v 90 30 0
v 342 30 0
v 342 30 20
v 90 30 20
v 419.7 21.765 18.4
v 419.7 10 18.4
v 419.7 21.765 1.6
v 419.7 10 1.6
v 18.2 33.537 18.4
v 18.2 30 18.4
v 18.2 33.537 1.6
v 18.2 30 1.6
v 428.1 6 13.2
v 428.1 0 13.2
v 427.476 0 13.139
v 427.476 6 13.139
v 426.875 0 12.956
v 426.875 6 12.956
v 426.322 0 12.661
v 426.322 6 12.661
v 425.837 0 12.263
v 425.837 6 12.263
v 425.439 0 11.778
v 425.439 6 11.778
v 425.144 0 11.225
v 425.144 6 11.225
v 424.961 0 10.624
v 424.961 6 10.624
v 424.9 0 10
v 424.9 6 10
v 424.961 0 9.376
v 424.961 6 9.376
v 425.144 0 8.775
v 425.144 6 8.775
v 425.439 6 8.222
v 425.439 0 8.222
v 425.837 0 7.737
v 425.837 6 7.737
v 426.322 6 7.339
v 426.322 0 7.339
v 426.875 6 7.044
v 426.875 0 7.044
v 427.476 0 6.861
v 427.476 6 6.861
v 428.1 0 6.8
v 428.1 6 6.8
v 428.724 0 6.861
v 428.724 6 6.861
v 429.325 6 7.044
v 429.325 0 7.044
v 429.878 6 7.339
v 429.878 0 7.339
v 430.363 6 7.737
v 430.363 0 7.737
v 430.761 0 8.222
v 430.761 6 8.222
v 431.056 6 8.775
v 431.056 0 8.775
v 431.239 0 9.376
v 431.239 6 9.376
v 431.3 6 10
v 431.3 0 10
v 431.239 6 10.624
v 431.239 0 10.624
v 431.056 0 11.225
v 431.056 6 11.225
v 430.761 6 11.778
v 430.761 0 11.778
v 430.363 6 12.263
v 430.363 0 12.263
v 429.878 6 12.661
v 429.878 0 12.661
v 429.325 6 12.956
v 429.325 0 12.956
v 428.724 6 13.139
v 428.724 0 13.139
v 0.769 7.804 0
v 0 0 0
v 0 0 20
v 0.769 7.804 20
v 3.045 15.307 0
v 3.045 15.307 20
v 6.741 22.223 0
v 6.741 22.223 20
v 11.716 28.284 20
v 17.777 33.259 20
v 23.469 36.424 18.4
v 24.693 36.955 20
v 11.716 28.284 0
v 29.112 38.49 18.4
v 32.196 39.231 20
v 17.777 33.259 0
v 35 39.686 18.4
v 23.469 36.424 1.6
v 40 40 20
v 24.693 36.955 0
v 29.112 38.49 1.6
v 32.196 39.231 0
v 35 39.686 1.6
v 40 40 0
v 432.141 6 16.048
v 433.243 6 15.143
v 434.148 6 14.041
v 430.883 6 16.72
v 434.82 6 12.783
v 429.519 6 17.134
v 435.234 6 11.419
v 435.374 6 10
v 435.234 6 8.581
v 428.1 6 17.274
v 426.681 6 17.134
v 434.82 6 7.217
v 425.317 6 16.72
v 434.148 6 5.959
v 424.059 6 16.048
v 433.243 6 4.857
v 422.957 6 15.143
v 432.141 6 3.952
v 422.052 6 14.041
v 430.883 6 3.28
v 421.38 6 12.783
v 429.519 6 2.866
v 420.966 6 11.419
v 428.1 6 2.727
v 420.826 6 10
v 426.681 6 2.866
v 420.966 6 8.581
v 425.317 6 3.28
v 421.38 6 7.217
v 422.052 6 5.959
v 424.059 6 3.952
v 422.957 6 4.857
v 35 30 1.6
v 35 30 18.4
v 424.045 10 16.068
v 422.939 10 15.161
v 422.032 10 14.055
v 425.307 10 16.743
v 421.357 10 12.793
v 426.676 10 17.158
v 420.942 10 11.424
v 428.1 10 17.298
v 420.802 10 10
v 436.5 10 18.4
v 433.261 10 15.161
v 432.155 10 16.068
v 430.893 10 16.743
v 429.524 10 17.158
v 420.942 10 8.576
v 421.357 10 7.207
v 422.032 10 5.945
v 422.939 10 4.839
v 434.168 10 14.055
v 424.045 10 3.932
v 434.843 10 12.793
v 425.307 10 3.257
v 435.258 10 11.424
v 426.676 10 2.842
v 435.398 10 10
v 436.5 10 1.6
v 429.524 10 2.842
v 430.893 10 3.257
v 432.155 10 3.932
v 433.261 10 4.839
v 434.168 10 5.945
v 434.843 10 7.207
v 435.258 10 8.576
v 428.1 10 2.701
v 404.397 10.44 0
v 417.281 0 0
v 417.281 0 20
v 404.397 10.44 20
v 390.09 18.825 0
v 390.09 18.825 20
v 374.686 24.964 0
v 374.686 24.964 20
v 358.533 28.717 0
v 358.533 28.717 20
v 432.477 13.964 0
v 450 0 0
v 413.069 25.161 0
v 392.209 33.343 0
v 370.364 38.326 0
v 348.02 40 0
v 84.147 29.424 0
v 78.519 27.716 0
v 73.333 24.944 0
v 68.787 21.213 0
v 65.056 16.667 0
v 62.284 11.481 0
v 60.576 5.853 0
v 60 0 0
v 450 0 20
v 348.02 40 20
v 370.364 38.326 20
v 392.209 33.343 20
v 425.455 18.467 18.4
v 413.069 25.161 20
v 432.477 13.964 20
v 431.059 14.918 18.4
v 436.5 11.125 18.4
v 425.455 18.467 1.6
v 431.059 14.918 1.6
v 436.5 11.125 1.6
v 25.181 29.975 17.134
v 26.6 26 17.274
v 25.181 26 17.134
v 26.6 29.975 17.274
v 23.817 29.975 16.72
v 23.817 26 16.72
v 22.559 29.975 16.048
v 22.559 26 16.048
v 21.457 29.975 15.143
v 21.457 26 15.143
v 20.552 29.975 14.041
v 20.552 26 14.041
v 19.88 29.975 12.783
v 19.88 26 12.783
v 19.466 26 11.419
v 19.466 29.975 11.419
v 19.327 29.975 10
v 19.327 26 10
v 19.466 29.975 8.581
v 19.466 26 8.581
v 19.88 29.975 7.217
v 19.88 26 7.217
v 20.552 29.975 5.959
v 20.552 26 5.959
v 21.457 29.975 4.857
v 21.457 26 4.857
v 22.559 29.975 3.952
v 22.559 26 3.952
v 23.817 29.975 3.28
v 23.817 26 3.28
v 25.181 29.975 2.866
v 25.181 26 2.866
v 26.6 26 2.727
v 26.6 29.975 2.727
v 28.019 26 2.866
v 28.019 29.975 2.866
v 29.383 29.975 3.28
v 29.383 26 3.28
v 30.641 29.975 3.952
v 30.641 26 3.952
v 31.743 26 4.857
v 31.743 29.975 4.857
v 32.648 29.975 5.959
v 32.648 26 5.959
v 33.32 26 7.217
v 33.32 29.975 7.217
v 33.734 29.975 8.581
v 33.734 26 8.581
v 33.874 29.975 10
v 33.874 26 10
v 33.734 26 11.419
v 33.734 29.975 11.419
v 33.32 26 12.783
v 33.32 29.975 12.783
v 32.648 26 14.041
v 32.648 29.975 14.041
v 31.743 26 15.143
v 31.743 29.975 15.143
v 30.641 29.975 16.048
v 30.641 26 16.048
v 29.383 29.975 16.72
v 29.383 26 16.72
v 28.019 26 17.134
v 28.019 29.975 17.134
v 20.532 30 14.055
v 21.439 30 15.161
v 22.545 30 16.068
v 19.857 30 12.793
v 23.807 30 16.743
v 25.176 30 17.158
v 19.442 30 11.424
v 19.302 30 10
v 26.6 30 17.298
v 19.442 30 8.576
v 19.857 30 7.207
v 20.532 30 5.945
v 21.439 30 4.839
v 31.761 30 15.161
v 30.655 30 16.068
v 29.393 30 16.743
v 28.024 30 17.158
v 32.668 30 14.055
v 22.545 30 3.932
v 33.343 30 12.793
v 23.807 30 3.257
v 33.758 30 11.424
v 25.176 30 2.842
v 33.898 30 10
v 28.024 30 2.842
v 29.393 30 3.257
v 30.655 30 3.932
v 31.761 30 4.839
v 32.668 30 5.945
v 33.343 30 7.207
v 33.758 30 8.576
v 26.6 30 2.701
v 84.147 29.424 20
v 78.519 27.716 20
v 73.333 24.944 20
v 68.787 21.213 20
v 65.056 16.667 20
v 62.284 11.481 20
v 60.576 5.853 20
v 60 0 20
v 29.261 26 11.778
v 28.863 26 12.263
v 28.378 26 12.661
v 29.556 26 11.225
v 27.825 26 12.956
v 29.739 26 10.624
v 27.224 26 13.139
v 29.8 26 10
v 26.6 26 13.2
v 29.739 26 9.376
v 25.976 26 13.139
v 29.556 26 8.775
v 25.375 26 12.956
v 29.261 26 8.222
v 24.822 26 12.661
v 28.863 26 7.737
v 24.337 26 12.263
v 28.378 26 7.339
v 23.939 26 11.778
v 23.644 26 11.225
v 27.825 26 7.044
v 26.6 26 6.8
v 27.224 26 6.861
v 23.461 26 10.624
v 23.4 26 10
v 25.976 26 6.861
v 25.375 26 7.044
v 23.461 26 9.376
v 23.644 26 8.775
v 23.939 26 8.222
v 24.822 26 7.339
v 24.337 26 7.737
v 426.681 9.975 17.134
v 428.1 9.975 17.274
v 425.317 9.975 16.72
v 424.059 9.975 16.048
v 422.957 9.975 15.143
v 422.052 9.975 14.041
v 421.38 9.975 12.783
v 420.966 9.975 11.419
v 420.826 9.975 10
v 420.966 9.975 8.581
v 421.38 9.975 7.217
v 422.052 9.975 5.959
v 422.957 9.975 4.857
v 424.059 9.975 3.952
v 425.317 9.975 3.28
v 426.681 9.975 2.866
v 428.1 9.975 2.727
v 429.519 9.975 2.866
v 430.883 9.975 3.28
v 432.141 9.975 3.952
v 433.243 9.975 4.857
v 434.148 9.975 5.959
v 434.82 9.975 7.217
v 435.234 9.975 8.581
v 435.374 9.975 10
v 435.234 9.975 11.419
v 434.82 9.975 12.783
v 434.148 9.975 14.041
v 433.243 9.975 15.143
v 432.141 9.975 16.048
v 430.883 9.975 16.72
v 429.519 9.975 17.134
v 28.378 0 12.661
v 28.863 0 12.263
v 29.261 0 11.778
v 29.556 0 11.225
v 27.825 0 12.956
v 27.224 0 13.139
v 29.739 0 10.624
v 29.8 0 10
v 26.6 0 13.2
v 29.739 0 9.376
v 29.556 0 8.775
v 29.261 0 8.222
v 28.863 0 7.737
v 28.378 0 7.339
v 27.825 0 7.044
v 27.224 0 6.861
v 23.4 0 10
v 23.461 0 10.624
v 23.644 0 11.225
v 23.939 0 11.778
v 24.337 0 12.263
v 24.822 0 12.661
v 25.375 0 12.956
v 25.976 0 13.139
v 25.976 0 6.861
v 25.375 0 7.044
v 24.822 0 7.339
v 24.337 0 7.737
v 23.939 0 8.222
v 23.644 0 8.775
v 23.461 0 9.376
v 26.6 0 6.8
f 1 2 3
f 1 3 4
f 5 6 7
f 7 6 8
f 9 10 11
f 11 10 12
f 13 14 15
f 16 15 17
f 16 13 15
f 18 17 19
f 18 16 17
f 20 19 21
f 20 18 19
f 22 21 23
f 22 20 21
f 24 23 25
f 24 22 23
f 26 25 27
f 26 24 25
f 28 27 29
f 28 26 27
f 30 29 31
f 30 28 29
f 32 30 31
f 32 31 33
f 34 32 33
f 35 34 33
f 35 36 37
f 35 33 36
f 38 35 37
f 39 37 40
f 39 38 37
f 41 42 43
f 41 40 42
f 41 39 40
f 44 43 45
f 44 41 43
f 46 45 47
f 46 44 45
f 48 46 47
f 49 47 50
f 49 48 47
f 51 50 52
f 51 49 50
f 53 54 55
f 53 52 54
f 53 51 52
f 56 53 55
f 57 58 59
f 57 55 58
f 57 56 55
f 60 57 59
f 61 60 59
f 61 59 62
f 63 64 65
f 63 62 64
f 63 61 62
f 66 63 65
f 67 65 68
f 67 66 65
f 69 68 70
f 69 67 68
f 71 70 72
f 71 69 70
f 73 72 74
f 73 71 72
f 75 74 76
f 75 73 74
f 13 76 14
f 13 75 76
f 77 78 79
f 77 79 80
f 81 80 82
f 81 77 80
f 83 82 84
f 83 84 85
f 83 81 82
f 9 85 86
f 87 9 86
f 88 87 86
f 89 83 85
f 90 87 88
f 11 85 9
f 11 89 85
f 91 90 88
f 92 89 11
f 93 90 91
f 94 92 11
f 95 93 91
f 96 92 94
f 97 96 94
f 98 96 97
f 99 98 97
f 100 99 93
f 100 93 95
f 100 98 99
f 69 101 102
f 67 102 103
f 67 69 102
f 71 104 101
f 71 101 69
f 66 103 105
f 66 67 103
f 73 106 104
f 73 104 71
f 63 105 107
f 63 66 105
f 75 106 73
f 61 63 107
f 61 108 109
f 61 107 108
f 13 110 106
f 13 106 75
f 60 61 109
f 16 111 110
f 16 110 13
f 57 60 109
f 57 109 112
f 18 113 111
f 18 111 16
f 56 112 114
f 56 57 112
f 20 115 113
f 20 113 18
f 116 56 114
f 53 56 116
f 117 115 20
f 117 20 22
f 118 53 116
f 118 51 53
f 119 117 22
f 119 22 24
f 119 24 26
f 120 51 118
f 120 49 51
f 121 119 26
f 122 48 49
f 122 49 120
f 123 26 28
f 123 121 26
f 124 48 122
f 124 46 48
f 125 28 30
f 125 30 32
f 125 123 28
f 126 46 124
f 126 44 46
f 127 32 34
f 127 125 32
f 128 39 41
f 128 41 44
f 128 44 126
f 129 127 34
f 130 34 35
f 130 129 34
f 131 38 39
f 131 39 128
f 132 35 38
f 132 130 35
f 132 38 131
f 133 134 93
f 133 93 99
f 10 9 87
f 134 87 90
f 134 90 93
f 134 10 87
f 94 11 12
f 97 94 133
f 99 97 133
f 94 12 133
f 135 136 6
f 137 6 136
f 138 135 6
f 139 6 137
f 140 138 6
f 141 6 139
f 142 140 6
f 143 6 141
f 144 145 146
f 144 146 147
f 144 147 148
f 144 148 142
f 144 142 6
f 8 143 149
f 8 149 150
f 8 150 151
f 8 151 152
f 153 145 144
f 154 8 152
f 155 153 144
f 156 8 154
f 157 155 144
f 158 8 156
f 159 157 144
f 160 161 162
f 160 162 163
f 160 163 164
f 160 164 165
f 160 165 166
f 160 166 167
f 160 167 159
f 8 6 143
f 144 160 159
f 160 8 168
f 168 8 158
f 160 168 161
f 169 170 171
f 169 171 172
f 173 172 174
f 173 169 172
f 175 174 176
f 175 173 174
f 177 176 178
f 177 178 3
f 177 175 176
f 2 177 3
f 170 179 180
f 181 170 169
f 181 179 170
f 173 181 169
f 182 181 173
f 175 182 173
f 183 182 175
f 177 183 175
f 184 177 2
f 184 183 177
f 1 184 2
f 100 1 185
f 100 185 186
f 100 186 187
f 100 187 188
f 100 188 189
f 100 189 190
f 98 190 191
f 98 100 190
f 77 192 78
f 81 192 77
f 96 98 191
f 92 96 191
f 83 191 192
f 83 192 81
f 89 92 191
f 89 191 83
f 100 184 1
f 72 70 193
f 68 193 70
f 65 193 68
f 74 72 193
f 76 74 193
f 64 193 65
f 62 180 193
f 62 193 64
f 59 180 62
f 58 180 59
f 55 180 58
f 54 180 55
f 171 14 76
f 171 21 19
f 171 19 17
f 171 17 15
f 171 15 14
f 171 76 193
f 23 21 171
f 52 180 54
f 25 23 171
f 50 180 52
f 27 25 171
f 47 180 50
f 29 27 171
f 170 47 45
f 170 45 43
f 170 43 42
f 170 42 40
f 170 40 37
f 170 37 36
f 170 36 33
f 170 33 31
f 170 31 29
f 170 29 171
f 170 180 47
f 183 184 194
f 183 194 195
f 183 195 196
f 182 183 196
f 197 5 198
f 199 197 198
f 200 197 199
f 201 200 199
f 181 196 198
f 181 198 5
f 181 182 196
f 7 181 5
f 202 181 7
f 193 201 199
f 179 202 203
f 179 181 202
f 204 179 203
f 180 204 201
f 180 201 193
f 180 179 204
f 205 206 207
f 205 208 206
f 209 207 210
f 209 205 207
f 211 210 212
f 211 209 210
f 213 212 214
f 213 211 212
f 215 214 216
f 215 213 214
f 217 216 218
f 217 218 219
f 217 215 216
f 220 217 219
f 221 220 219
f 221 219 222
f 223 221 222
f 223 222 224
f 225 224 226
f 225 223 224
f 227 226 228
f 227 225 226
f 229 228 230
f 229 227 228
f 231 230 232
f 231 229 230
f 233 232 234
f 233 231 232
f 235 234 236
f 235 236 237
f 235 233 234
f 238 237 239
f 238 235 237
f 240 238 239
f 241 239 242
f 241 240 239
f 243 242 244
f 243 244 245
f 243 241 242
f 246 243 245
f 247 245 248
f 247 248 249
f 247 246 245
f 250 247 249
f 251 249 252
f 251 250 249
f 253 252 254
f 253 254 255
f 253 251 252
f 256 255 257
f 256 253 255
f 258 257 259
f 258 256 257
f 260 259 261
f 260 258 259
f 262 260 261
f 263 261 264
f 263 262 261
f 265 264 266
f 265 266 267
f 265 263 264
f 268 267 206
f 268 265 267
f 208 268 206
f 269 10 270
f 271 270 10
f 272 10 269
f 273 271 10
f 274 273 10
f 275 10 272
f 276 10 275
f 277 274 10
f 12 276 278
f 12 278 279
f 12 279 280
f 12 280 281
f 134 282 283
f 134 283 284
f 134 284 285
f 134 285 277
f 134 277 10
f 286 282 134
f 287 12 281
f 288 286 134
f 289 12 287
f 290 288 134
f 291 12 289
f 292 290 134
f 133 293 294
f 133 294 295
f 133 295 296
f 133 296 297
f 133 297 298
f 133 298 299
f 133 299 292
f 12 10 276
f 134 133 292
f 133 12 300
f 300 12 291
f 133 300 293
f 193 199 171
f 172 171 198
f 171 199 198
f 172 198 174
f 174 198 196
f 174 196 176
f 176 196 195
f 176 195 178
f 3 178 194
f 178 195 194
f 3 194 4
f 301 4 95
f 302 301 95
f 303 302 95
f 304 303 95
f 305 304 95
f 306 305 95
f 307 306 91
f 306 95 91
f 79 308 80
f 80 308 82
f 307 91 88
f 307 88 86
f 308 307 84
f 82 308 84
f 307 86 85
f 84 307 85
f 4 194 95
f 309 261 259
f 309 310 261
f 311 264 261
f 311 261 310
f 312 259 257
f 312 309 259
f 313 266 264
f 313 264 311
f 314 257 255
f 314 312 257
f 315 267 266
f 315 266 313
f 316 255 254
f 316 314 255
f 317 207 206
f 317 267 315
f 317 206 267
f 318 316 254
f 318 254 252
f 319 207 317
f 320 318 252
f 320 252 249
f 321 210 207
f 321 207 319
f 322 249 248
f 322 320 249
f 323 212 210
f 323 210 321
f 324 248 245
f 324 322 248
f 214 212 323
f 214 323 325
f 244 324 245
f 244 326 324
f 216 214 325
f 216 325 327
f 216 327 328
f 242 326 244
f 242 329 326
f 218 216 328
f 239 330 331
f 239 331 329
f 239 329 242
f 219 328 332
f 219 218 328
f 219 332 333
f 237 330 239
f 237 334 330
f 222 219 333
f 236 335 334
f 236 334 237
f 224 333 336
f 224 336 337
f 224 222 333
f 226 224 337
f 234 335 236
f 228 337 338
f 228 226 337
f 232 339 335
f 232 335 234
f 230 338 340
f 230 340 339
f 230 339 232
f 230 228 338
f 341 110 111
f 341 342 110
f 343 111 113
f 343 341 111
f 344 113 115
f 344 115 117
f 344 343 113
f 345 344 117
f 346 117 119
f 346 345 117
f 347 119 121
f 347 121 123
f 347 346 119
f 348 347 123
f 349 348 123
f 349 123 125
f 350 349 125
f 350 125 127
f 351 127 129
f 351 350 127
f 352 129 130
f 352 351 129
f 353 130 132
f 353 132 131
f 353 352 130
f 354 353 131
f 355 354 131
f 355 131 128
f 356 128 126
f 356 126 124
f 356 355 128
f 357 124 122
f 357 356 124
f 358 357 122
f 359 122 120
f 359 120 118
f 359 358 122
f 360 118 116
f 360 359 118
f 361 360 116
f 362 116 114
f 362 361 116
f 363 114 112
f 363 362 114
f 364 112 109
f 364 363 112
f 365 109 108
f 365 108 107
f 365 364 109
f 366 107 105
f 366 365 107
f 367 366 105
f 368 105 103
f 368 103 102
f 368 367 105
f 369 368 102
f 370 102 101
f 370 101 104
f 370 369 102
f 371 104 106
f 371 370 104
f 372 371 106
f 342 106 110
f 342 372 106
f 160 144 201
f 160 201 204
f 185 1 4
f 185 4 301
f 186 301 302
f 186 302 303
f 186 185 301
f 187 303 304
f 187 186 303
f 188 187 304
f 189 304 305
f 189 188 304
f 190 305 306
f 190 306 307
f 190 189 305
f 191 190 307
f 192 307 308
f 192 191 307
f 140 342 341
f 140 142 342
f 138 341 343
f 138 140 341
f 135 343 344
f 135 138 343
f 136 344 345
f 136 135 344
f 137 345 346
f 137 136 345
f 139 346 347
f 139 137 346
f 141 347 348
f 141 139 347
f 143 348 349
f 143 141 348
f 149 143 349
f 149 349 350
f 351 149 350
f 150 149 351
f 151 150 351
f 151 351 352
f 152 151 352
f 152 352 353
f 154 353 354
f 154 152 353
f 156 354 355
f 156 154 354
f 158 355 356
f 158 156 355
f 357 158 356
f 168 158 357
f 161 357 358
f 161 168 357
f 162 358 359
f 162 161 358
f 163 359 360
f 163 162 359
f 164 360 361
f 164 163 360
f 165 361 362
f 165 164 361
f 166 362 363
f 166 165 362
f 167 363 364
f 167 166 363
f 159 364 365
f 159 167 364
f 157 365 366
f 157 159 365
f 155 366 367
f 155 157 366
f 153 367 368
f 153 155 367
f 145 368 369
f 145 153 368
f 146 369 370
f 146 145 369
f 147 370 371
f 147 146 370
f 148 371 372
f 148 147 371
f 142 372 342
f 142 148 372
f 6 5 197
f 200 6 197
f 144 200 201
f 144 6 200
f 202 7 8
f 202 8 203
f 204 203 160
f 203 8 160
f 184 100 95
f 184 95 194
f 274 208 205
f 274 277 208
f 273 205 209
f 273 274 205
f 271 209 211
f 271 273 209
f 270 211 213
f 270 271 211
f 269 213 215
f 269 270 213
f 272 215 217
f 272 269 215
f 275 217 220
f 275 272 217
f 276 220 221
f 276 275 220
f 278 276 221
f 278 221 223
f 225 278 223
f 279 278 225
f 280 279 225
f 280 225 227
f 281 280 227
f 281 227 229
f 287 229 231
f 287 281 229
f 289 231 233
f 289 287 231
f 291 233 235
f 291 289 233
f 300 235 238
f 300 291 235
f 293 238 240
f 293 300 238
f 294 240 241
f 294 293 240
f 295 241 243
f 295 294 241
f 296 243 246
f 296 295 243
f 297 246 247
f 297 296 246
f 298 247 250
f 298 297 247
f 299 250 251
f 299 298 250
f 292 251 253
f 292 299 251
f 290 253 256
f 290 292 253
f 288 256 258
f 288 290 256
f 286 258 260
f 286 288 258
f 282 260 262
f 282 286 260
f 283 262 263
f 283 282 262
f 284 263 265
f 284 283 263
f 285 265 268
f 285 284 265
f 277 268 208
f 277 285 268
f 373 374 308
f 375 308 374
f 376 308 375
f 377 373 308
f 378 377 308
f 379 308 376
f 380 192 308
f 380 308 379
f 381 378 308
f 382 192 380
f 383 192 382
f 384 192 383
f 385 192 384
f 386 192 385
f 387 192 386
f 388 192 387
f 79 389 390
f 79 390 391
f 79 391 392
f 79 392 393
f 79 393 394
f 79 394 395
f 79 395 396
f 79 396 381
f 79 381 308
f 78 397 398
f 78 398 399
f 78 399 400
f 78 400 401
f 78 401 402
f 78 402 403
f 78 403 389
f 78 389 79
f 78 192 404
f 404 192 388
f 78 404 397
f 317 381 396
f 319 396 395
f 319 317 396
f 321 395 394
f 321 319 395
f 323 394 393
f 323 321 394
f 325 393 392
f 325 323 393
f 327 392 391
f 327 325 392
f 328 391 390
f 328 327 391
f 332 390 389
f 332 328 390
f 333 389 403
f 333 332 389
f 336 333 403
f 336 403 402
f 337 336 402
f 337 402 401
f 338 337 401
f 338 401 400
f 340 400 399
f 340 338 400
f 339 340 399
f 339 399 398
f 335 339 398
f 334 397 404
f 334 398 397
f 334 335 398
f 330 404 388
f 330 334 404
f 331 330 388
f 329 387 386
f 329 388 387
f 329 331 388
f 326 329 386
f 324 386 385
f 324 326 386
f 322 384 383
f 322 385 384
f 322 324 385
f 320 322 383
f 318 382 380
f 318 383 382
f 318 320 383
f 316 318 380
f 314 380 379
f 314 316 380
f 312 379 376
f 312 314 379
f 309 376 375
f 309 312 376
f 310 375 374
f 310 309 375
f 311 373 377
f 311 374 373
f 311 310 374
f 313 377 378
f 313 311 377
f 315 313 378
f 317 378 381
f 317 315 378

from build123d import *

# Parameters (mm, degrees)
DODANIE_WYCI_GNI_CIE2_DEPTH = 20
SZKIC28_W                   = 16.8
SZKIC28_H                   = 16.8
WYTNIJ_WYCI_GNI_CIE1_DEPTH  = 20
SZKIC29_W                   = 16.8
SZKIC29_H                   = 16.8
WYTNIJ_WYCI_GNI_CIE2_DEPTH  = 20


with BuildPart() as part:
    # Szkic1 → Dodanie-wyciągnięcie2 (new body)
    with BuildSketch(Plane.XY):
        with BuildLine():
            Line((40, 40), (348.019609728, 40))
            ThreePointArc((348.019609728, 40), (402.791865479, 29.642400438), (450, 0))
            Line((450, 0), (417.280680948, 0))
            ThreePointArc((417.280680948, 0), (382.503671889, 22.185117958), (342, 30))
            Line((342, 30), (116.308192204, 30))
            Line((116.308192204, 30), (90, 30))
            ThreePointArc((90, 30), (68.786796564, 21.213203436), (60, 0))
            Line((60, 0), (0, 0))
            ThreePointArc((0, 0), (11.715728753, 28.284271247), (40, 40))
        make_face()
    extrude(amount=DODANIE_WYCI_GNI_CIE2_DEPTH)

    # Szkic28 → Wytnij-wyciągnięcie1 (cut)
    with BuildSketch(Plane(origin=(0, 30, 0), x_dir=(1, 0, 0), z_dir=(0, 1, 0))):
        with Locations((26.6, -10)):
            Rectangle(SZKIC28_W, SZKIC28_H)
    extrude(amount=WYTNIJ_WYCI_GNI_CIE1_DEPTH, mode=Mode.SUBTRACT)

    # Szkic29 → Wytnij-wyciągnięcie2 (cut)
    with BuildSketch(Plane(origin=(0, 10, 0), x_dir=(1, 0, 0), z_dir=(0, 1, 0))):
        with Locations((428.1, -10)):
            Rectangle(SZKIC29_W, SZKIC29_H)
    extrude(amount=WYTNIJ_WYCI_GNI_CIE2_DEPTH, mode=Mode.SUBTRACT)

    # Szkic32 → Pog_bienie walcowe pod M6 wkr_t z _bem s (revolve, cut)
    with BuildSketch(Plane(origin=(428.1, 10, 10), x_dir=(0, 0, 1), z_dir=(1, 0, 0))):
        Polygon((0, 0), (0, 26.922753981), (3.2, 25), (3.2, 4), (7.2735, 4), (7.2735, 0.025), (7.2985, 0), align=None)
    revolve(axis=Axis((428.1, 16.35, 10), (0, -1, 0)), mode=Mode.SUBTRACT)

    # Szkic34 → Pog_bienie walcowe pod M6 wkr_t z _b 2 (revolve, cut)
    with BuildSketch(Plane(origin=(26.6, 30, 10), x_dir=(0, 0, 1), z_dir=(1, 0, 0))):
        Polygon((0, 0), (0, 41.922753981), (3.2, 40), (3.2, 4), (7.2735, 4), (7.2735, 0.025), (7.2985, 0), align=None)
    revolve(axis=Axis((26.6, 36.35, 10), (0, -1, 0)), mode=Mode.SUBTRACT)


solid = part.part
